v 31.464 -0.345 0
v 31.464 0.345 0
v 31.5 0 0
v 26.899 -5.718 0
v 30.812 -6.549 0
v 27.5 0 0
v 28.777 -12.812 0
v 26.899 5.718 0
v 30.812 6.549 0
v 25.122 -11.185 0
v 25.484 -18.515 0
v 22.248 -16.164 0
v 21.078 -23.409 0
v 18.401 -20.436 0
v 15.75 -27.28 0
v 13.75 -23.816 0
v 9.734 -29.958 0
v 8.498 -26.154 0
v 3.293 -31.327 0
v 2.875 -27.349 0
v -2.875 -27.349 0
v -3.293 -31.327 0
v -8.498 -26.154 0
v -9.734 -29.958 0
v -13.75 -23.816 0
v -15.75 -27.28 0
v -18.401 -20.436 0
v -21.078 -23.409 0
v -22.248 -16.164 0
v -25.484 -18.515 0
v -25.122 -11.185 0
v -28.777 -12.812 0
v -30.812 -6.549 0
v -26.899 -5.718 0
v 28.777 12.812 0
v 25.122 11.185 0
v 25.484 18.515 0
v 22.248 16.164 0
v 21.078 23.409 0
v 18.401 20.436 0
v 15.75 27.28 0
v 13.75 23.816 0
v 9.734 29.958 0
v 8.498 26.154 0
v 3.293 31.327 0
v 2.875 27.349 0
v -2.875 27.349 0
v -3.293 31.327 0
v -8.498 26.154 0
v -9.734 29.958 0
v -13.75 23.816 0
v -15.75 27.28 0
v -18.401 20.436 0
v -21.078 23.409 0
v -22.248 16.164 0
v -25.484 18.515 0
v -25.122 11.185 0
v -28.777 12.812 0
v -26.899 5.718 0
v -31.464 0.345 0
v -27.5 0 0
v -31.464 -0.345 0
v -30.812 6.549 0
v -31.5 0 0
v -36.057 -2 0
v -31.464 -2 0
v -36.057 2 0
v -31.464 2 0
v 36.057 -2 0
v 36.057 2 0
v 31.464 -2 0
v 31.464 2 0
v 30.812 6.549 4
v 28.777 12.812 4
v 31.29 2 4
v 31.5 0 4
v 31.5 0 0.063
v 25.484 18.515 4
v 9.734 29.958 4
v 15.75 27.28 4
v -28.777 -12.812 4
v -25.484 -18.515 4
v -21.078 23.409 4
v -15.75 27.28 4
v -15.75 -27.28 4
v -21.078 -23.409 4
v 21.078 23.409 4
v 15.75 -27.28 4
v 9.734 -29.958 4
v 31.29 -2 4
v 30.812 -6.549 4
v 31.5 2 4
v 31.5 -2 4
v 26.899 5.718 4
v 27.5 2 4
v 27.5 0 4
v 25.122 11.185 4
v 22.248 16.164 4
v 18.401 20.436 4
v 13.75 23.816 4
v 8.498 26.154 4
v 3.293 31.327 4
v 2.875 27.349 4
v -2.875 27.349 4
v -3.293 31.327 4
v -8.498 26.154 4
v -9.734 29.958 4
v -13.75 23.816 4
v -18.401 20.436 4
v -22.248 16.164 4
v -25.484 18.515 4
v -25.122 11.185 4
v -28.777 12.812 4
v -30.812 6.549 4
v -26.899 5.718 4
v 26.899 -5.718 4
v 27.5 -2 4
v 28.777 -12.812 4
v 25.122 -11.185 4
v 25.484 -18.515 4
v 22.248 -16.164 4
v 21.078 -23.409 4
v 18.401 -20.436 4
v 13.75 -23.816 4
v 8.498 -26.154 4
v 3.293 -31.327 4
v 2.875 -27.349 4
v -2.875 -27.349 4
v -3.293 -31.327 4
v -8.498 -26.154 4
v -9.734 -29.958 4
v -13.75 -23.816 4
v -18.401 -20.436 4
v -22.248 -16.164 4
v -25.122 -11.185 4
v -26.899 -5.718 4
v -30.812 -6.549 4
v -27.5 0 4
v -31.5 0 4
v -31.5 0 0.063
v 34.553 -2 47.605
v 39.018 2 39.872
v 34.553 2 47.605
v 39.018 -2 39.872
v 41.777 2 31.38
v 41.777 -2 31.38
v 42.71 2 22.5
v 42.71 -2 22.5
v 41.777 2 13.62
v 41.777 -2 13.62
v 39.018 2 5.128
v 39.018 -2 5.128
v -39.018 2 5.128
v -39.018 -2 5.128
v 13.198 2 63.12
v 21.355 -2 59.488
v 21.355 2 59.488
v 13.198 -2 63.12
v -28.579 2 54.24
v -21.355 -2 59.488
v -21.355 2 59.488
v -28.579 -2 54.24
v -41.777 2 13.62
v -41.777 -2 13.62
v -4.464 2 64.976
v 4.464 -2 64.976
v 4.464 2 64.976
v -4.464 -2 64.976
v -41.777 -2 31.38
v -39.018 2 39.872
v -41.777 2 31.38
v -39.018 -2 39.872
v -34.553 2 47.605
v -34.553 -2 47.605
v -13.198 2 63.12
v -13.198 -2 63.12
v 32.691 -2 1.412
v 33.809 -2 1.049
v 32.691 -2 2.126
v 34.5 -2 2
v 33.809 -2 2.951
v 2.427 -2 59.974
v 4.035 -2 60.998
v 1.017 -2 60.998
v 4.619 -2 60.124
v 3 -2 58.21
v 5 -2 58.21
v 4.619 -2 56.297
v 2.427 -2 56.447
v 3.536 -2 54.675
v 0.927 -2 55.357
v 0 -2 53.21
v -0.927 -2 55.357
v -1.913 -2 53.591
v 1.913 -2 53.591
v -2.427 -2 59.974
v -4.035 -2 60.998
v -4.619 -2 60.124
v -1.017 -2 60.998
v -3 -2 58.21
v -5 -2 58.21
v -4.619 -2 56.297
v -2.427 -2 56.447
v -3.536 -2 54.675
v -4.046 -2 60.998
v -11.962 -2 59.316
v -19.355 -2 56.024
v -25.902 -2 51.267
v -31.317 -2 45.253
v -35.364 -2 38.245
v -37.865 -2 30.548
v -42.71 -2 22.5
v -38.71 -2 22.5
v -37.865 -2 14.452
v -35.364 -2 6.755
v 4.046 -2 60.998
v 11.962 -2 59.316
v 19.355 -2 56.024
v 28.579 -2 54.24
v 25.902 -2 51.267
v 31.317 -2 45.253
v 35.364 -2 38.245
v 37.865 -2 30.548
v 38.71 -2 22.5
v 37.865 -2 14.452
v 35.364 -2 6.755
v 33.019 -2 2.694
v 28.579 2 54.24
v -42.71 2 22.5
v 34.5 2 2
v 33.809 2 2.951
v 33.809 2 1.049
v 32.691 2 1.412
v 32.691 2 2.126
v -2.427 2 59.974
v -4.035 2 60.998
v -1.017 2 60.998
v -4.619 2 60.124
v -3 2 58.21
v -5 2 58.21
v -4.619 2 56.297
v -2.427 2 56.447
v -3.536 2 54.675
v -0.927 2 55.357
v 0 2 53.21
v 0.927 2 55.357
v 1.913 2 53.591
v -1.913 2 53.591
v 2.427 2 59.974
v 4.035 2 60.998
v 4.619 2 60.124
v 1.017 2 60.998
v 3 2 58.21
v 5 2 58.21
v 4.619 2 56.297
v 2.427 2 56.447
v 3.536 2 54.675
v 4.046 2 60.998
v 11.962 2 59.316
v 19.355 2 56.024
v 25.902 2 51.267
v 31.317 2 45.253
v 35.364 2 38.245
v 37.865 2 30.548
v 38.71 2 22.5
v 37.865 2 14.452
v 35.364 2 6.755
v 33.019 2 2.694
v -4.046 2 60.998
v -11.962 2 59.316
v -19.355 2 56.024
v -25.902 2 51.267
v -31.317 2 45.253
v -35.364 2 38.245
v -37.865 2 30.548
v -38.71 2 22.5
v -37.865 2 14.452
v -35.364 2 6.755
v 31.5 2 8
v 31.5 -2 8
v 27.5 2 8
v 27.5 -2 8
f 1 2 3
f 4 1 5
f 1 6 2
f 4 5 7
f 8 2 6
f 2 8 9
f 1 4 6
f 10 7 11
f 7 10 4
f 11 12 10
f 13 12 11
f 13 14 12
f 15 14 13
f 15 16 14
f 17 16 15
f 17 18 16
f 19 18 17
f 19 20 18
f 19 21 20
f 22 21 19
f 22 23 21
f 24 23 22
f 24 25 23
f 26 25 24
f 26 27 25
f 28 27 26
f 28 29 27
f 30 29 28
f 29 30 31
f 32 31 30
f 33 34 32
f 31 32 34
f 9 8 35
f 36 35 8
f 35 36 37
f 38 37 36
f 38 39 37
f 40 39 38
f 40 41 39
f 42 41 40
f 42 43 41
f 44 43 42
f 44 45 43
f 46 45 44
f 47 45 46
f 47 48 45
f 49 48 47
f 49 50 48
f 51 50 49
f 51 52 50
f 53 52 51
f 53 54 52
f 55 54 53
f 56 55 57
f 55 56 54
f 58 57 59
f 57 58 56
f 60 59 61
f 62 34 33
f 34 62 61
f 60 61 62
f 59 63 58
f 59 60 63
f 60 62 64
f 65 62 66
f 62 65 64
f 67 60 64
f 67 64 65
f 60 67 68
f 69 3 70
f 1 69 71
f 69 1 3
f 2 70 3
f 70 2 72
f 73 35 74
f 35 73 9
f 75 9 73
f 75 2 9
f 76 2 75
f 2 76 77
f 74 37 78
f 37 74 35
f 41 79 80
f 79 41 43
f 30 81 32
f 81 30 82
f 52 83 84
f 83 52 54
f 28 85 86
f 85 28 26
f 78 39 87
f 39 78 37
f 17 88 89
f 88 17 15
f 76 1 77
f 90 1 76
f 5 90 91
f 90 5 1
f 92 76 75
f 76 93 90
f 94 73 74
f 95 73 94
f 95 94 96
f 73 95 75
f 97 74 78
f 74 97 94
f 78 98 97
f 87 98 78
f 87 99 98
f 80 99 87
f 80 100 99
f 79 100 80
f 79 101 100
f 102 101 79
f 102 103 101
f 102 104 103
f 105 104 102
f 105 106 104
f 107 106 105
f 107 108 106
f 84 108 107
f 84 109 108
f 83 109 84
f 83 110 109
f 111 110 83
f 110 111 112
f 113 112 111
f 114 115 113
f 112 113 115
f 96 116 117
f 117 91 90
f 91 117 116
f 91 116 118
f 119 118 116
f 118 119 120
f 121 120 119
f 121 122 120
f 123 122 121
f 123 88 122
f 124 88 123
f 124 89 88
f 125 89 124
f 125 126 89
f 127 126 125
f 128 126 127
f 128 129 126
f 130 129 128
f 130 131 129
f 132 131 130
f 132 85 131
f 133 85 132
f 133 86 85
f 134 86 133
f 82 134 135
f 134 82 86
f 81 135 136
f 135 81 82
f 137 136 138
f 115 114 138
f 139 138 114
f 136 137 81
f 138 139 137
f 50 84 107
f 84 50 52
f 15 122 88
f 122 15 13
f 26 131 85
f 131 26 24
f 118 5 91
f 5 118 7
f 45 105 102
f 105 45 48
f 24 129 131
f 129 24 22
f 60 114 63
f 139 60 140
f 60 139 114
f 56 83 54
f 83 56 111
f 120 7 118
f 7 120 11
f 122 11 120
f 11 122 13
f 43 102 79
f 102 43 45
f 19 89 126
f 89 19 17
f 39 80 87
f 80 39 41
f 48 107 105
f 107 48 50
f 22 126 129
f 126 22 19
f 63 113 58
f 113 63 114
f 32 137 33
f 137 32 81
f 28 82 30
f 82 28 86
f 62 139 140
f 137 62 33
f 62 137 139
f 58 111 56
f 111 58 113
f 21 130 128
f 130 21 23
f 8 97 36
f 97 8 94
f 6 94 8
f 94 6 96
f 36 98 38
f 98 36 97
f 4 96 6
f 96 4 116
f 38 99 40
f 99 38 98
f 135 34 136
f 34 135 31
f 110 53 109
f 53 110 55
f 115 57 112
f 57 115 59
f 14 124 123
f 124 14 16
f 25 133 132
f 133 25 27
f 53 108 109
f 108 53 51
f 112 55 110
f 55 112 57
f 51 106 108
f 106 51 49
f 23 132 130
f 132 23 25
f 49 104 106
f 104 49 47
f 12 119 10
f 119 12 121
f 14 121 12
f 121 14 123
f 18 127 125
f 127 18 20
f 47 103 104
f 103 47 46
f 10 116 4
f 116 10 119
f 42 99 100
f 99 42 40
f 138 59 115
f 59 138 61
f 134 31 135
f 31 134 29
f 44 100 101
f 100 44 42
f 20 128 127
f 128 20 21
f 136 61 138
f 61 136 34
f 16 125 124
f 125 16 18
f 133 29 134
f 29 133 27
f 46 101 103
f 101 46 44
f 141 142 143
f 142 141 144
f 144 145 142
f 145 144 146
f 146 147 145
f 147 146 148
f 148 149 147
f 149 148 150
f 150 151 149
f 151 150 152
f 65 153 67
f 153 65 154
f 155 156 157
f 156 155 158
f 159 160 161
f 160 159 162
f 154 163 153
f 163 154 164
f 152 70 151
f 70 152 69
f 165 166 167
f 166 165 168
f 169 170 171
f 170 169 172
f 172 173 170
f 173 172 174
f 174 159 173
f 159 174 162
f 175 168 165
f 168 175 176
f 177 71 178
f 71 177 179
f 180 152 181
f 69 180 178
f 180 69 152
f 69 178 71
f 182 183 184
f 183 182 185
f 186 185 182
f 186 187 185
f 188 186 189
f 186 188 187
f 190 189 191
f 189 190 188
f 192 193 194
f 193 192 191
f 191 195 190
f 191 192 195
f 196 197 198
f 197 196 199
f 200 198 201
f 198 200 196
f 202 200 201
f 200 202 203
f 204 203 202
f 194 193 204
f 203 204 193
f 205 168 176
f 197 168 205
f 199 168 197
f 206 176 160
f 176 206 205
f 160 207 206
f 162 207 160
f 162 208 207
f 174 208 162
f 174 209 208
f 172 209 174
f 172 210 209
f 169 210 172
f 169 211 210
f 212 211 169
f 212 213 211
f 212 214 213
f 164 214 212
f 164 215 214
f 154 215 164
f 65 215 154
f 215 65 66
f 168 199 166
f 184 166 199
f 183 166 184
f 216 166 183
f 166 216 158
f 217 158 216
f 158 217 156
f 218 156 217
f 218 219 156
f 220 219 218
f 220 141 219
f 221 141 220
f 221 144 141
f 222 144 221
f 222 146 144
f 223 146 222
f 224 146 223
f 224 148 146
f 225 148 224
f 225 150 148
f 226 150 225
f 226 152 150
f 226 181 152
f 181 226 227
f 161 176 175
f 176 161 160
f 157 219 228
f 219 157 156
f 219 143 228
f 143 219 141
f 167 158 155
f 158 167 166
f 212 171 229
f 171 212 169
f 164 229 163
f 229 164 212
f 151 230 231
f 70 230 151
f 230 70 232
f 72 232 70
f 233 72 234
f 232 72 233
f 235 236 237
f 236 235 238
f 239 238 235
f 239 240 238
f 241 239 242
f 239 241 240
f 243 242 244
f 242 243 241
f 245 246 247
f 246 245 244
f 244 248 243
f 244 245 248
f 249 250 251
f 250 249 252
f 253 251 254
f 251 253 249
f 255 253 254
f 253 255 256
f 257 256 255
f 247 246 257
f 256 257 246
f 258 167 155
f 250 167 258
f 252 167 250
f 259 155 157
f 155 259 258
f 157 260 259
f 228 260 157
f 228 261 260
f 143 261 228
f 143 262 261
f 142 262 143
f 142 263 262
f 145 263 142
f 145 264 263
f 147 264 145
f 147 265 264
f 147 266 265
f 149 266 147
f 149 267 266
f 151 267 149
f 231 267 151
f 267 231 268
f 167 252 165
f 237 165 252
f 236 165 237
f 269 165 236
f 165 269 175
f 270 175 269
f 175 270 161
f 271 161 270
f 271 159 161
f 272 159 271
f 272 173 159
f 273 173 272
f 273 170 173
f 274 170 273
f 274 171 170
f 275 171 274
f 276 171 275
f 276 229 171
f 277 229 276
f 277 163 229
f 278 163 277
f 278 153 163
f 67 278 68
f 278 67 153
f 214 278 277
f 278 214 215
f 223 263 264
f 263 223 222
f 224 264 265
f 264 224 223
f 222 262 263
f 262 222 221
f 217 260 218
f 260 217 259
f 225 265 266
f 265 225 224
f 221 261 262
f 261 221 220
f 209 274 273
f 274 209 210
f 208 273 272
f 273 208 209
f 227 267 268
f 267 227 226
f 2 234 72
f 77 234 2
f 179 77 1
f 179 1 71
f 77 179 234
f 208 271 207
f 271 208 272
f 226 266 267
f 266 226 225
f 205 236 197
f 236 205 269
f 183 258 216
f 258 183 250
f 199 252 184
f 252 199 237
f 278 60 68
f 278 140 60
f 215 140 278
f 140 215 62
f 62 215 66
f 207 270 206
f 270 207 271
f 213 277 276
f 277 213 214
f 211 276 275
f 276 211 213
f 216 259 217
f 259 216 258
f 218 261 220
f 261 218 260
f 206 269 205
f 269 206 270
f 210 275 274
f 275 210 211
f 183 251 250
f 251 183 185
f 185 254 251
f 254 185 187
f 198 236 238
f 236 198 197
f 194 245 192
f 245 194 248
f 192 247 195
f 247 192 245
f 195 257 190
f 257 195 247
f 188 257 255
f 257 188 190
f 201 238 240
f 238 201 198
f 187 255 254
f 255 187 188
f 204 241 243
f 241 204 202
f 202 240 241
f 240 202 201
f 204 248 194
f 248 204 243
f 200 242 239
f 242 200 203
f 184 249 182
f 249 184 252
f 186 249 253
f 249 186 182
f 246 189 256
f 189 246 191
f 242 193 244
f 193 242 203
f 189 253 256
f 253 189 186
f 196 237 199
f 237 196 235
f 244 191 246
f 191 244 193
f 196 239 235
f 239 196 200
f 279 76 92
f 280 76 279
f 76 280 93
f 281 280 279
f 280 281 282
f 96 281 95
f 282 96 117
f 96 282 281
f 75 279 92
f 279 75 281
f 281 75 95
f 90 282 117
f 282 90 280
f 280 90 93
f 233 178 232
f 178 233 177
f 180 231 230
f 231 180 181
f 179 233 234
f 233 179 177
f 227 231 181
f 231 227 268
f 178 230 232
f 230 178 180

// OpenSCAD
difference() {
	union() {
		difference() {
			cylinder(d = 63, h = 4);
			translate(v = [0, 0, -2.0000000000]) {
				cylinder(d = 55, h = 8);
			}
		}
		difference() {
			translate(v = [0, 2.0000000000, 0]) {
				translate(v = [0, 0, 22.5000000000]) {
					rotate(a = [90, 0, 0]) {
						union() {
							difference() {
								cylinder(d = 85.4209274034, h = 4);
								translate(v = [0, 0, -2.0000000000]) {
									cylinder(d = 77.4209274034, h = 8);
								}
							}
							translate(v = [0, 35.7104637017, 0]) {
								difference() {
									cylinder(d = 10, h = 4);
									translate(v = [0, 0, -2.0000000000]) {
										cylinder(d = 6, h = 8);
									}
								}
							}
						}
					}
				}
			}
			translate(v = [0, 0, -500]) {
				cube(center = true, size = [1000, 1000, 1000]);
			}
		}
		translate(v = [29.5000000000, 0, 0]) {
			translate(v = [0, 0, 6.0000000000]) {
				cube(center = true, size = [4, 4, 4]);
			}
		}
	}
	translate(v = [0, 5, 0]) {
		translate(v = [0, 0, 2.0000000000]) {
			translate(v = [33.5000000000, 0, 0]) {
				rotate(a = [90, 0, 0]) {
					cylinder(d = 2, h = 10);
				}
			}
		}
	}
}
